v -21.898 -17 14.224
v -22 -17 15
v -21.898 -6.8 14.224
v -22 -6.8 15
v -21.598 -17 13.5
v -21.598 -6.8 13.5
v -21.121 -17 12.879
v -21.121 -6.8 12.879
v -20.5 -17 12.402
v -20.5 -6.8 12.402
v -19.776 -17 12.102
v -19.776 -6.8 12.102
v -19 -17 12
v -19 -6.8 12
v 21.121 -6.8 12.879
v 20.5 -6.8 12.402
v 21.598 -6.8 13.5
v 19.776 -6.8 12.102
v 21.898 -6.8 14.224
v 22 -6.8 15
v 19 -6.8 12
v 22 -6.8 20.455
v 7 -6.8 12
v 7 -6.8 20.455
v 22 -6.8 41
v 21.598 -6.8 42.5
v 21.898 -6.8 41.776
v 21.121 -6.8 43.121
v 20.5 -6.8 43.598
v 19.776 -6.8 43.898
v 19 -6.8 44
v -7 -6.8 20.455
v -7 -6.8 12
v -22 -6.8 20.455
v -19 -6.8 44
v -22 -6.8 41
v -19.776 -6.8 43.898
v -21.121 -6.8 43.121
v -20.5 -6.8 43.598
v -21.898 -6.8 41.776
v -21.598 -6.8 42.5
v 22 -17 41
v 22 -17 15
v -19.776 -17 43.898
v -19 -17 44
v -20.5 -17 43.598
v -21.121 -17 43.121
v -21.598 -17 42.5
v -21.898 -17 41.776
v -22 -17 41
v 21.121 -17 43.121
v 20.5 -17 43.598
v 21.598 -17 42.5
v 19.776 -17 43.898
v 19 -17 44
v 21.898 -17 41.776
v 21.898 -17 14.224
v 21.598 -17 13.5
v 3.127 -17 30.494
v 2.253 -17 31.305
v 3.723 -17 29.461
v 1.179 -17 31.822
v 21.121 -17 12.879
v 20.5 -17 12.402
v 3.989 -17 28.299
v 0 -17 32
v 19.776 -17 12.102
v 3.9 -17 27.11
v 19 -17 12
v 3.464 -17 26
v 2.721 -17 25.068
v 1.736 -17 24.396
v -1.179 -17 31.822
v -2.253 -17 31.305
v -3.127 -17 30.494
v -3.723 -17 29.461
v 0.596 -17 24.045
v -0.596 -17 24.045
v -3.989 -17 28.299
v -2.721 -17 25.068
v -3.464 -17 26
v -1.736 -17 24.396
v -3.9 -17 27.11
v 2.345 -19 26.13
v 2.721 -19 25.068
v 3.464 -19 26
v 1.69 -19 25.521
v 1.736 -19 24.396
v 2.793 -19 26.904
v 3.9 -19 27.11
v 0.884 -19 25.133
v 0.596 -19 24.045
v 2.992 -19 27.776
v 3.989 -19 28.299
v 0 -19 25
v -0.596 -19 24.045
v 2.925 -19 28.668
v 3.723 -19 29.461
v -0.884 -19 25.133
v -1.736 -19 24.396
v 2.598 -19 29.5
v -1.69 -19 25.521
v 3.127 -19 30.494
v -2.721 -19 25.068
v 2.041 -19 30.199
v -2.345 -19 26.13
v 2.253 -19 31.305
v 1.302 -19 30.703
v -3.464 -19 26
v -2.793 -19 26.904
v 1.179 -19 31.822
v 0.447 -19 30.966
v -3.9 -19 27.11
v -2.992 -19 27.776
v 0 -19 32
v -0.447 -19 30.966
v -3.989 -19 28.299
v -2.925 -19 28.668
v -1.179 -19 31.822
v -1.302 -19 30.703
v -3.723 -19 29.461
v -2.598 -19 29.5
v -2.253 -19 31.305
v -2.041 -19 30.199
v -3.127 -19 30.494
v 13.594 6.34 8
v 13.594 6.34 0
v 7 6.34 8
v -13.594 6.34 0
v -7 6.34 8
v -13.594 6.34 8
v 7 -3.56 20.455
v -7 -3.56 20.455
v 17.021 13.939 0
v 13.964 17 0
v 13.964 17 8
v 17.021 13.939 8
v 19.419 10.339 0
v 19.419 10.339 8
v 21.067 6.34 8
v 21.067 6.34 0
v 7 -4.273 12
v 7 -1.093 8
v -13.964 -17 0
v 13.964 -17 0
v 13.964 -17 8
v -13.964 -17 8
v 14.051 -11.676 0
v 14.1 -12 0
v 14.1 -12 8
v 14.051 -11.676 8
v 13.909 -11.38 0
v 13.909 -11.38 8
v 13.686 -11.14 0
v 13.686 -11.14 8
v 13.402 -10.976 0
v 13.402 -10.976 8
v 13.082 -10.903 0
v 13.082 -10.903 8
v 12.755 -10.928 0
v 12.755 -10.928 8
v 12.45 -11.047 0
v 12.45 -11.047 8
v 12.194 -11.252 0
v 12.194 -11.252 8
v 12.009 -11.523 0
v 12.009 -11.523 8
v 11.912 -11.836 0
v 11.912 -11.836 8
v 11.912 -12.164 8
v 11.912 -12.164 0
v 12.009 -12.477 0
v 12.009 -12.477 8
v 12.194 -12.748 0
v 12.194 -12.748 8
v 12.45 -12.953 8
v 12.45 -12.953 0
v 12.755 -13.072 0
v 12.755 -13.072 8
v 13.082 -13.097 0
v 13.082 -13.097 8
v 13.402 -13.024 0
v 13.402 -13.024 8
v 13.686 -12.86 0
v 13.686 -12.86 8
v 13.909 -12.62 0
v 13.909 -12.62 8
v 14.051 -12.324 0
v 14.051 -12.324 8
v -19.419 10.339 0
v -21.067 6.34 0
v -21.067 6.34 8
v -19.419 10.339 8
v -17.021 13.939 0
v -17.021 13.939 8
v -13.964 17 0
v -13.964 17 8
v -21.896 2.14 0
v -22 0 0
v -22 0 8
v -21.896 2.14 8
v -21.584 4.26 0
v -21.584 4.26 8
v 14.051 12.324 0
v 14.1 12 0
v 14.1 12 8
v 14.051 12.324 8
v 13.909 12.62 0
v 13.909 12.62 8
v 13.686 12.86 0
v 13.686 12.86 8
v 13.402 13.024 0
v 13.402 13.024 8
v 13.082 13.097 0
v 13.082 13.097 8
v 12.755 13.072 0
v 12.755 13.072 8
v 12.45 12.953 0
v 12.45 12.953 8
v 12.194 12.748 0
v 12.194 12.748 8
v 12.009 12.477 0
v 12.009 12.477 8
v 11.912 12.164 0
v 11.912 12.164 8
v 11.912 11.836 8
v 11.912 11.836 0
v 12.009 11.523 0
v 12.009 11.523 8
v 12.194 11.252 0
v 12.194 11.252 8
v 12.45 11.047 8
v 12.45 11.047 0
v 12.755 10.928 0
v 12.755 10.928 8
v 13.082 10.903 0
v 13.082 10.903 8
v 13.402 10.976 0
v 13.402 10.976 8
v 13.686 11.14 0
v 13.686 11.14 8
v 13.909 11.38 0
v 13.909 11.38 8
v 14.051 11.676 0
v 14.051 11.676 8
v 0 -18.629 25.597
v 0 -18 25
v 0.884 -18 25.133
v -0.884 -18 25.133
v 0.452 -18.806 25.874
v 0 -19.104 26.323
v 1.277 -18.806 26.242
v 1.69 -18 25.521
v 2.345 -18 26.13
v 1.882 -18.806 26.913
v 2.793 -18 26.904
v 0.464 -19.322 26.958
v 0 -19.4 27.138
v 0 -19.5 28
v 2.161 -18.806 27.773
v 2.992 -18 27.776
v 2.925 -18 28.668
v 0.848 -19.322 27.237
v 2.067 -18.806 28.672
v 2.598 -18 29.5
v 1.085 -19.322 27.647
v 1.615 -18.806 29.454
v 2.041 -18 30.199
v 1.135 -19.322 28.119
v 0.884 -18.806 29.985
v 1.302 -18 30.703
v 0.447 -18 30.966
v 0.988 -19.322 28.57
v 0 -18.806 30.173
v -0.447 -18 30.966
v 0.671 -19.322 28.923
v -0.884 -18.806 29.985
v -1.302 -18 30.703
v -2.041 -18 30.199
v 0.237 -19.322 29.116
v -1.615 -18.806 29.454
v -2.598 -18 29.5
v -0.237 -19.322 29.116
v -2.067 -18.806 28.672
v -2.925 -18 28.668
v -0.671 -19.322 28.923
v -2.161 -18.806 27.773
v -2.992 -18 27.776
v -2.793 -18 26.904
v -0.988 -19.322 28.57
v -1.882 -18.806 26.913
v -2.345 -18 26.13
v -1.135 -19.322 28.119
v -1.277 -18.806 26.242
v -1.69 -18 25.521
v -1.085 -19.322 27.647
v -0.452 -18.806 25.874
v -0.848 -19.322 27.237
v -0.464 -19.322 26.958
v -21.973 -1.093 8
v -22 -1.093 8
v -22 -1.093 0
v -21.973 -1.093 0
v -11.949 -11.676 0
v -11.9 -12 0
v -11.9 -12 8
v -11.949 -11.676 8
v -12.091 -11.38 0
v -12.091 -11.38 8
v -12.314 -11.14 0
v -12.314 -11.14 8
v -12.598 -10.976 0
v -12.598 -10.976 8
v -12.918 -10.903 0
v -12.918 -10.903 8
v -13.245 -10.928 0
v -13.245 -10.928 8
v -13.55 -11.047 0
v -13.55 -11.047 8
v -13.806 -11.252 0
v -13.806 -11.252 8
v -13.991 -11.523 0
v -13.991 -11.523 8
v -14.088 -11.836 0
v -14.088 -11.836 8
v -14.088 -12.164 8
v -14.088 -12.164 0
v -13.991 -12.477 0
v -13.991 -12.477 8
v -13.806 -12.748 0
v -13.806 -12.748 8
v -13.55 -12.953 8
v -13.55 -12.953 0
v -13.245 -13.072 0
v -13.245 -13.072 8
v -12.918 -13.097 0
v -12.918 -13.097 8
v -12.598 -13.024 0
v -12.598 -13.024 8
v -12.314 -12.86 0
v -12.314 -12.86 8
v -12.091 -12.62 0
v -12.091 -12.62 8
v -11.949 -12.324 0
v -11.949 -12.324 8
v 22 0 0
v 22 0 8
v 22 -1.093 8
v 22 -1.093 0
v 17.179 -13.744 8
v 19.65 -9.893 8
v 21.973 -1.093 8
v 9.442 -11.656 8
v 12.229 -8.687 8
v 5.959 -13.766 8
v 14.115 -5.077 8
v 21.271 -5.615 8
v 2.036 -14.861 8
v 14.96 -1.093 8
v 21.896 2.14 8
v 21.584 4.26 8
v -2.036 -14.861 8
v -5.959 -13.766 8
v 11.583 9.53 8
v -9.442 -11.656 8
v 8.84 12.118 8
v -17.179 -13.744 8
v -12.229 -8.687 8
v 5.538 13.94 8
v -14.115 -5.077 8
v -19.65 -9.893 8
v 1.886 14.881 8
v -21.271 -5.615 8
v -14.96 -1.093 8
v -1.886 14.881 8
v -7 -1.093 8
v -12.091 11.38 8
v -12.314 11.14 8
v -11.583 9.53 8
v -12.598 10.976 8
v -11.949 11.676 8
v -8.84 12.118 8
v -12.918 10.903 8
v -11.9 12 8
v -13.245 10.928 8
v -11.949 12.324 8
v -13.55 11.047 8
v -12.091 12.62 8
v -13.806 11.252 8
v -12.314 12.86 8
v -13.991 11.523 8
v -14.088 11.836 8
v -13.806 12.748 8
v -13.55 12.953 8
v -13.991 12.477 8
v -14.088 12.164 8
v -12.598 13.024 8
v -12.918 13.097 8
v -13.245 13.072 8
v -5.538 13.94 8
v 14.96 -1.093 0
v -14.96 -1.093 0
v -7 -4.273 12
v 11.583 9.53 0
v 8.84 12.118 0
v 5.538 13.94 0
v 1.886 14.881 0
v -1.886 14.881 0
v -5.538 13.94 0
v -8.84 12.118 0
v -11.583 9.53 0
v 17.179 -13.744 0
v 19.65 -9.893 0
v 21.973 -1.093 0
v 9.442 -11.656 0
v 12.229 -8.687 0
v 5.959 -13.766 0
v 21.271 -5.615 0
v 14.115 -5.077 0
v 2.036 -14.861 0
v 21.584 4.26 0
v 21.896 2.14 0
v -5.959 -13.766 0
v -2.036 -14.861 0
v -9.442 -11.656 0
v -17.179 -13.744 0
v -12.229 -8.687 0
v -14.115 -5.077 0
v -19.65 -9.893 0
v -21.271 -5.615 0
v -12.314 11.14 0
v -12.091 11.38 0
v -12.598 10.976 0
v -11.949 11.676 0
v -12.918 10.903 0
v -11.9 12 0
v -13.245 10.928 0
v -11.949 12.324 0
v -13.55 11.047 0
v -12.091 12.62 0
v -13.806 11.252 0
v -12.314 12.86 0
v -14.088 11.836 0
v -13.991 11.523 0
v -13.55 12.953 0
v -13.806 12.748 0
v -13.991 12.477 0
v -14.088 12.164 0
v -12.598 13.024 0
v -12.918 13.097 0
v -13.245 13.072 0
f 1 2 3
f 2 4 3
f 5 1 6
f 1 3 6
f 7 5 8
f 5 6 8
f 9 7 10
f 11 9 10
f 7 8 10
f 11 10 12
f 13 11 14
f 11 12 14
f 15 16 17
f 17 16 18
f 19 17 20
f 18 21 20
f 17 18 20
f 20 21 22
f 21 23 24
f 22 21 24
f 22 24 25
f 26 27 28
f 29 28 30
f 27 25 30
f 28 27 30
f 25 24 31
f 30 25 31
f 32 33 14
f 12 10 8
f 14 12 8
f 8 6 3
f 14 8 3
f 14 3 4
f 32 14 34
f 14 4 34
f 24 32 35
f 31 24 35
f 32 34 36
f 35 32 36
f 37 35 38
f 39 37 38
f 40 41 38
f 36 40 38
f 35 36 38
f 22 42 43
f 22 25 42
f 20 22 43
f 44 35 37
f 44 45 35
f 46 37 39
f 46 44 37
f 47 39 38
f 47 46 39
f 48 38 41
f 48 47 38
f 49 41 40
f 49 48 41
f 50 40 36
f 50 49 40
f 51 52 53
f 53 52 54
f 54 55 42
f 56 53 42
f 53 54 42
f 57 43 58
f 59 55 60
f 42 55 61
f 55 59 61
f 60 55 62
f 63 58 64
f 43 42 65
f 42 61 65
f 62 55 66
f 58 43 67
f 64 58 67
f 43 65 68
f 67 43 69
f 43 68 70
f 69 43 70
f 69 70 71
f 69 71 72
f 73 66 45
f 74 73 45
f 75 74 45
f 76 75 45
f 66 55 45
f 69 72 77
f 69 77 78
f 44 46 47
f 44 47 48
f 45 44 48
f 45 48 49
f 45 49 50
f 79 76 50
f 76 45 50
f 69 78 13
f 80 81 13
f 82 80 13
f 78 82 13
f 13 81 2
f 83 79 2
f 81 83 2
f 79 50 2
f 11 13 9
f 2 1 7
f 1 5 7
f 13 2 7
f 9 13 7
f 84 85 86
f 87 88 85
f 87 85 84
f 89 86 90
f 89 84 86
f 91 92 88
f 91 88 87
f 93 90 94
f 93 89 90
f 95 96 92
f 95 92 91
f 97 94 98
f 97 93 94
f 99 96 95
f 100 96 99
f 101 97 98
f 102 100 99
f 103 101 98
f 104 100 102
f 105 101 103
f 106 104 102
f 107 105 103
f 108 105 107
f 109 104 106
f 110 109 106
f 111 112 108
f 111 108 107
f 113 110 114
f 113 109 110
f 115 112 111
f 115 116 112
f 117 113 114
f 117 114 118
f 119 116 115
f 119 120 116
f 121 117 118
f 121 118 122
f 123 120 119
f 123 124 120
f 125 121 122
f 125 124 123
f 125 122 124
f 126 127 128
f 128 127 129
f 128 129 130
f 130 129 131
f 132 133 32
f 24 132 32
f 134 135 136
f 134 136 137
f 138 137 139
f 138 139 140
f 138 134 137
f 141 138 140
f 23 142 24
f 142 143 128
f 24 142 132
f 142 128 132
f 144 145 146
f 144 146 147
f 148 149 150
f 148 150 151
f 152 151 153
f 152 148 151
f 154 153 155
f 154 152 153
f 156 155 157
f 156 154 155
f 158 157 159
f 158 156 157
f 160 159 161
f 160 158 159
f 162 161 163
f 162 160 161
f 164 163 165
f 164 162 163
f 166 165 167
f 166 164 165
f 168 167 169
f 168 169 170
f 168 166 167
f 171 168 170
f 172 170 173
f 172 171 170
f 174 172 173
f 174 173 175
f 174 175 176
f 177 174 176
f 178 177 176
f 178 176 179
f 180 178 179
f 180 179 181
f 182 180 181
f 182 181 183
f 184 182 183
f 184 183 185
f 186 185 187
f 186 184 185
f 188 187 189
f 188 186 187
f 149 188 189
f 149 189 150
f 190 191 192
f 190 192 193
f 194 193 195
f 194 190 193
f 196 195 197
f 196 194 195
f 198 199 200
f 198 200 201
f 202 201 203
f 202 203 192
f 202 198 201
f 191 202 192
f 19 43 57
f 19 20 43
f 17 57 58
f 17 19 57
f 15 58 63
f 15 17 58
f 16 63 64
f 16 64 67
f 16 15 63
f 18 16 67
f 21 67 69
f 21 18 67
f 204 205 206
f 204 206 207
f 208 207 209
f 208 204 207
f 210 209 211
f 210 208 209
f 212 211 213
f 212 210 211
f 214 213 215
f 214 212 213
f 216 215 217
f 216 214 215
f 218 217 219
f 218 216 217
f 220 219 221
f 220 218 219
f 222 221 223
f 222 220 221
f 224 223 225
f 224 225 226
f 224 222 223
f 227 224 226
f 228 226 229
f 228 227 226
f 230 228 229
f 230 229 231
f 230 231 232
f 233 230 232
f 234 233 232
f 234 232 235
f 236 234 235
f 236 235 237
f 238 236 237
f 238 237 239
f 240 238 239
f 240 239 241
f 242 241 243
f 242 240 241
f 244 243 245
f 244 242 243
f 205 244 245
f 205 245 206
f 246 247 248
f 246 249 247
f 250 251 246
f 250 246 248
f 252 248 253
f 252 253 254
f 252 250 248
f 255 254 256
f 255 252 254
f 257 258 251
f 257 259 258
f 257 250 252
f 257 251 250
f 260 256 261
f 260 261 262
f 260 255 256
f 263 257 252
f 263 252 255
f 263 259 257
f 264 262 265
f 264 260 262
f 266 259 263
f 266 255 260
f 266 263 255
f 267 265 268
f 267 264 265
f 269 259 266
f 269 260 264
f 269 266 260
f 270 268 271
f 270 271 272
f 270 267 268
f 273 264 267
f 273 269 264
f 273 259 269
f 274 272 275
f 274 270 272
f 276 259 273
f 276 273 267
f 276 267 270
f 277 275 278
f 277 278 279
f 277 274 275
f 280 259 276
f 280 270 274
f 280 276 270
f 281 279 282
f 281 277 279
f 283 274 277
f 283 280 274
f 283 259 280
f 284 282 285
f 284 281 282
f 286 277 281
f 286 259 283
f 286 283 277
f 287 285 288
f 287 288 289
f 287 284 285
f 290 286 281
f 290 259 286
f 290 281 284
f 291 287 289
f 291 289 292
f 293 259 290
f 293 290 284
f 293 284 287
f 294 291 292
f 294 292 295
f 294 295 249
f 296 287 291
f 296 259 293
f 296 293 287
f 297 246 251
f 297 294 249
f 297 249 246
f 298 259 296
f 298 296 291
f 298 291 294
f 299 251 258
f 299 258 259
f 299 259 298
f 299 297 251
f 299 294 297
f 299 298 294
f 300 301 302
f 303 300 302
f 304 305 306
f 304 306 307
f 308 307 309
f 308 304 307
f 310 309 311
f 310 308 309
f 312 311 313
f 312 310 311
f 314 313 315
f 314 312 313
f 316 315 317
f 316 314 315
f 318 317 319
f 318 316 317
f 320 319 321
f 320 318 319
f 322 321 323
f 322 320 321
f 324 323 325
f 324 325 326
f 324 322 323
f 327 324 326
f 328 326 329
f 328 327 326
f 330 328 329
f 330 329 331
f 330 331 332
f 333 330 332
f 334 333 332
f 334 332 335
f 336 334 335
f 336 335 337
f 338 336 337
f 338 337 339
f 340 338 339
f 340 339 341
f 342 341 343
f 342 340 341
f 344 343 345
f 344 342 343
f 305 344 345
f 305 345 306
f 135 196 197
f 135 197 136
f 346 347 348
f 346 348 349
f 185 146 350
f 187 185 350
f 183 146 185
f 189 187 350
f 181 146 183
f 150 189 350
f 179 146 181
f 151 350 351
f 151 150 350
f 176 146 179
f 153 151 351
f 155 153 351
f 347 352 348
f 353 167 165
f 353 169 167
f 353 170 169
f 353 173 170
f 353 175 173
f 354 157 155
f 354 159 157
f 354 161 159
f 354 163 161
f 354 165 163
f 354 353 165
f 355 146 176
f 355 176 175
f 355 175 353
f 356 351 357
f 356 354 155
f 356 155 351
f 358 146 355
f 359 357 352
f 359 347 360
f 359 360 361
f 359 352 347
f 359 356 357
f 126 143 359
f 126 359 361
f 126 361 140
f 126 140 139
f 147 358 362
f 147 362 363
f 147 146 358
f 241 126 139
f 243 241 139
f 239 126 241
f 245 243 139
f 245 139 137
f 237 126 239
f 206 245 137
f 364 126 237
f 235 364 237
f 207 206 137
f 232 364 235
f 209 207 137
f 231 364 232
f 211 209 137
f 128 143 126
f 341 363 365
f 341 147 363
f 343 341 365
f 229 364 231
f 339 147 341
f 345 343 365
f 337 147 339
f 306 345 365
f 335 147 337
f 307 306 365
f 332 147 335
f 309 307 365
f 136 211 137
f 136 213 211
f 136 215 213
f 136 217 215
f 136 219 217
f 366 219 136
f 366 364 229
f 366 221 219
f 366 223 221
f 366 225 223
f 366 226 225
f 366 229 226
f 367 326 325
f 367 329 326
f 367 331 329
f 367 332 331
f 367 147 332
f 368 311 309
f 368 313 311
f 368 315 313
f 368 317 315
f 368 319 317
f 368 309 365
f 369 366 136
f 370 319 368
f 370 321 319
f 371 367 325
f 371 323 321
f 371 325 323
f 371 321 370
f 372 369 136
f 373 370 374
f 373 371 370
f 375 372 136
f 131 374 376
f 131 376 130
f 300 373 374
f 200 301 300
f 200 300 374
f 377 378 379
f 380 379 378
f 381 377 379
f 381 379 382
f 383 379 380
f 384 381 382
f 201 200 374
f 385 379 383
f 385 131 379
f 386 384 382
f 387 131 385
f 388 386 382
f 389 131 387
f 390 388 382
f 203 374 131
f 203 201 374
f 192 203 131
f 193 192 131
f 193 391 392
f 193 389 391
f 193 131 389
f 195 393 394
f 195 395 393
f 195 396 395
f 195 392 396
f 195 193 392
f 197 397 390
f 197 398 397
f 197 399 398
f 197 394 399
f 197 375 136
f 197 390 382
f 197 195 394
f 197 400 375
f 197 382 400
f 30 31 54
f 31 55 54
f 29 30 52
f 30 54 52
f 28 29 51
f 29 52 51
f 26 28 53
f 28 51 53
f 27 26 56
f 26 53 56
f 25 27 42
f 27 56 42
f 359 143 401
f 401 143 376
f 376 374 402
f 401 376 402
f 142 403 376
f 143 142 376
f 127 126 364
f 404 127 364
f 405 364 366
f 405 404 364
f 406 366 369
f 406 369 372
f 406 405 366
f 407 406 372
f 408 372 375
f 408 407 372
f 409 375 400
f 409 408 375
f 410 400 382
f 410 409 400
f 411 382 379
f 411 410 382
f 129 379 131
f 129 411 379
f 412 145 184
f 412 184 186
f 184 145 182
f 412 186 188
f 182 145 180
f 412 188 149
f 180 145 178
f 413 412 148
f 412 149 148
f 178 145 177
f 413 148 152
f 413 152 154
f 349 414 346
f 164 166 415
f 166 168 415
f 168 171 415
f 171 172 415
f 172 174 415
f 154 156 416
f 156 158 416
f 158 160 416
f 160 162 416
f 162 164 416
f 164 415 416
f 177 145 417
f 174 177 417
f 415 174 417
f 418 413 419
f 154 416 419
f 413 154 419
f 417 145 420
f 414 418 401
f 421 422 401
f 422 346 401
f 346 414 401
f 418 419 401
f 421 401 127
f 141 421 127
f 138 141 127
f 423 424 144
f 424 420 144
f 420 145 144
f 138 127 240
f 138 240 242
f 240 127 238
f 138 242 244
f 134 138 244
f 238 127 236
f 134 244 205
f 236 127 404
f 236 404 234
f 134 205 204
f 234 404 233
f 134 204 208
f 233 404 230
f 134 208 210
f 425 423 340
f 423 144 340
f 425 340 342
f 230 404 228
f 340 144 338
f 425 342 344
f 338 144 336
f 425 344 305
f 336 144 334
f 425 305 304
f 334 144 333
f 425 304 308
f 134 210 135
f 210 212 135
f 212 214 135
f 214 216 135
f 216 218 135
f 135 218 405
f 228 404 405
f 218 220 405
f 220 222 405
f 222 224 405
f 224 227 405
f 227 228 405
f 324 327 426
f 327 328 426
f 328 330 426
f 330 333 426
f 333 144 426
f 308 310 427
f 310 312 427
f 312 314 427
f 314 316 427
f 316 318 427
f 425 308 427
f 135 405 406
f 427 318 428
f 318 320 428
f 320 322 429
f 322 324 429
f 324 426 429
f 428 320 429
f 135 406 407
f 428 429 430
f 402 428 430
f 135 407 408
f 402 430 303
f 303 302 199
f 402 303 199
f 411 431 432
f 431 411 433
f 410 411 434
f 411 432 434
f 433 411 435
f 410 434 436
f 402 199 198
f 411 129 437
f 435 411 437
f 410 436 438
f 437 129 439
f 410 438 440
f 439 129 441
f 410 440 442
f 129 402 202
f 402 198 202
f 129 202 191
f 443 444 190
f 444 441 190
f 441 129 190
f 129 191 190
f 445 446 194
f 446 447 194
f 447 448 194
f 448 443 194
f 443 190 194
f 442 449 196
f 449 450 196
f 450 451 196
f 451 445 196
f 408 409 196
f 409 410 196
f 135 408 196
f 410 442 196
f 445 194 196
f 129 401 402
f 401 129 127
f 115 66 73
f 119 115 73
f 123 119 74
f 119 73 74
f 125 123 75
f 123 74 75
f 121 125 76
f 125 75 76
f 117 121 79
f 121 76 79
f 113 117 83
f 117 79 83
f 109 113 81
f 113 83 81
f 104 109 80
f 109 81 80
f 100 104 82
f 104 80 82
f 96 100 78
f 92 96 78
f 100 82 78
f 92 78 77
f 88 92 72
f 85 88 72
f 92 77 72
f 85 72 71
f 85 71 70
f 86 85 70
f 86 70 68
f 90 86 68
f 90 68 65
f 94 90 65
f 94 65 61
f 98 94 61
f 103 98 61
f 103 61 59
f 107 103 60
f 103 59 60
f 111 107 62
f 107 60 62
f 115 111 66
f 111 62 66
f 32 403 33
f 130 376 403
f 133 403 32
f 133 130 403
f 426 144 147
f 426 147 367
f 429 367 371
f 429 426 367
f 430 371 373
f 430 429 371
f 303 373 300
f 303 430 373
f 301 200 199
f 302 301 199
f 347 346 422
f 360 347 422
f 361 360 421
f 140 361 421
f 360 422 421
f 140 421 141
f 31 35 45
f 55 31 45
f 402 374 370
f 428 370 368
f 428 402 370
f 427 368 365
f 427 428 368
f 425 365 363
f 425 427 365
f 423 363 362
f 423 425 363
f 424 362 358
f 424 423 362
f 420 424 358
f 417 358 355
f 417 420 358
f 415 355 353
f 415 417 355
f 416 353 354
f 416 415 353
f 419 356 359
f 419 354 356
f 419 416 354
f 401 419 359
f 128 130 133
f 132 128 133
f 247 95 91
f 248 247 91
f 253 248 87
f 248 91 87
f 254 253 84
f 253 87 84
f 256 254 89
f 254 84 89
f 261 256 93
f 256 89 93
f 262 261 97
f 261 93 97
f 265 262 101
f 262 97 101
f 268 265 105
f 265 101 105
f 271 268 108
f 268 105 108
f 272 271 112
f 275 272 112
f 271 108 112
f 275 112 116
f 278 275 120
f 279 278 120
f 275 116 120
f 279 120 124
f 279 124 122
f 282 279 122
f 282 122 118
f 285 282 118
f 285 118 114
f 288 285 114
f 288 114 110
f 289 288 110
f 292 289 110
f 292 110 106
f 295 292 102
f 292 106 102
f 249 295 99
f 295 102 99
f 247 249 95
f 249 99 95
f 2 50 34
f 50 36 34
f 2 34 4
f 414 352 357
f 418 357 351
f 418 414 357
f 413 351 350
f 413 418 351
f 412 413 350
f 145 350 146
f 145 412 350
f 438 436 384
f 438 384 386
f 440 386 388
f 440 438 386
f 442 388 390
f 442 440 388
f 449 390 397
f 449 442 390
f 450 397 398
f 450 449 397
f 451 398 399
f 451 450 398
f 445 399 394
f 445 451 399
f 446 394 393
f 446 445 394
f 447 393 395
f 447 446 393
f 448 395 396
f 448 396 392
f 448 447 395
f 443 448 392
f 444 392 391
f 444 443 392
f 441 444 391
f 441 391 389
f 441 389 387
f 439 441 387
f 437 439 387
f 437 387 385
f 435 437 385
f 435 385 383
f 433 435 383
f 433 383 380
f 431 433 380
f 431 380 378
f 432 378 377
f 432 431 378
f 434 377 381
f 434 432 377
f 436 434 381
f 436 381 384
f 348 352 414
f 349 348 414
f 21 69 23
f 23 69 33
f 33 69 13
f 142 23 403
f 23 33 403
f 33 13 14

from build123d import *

# Parameters (mm, degrees)
SKETCH_1_R           = 15
SKETCH_1_R_2         = 1.1
EXTRUDE_1_DEPTH      = 8
EXTRUDE_2_DEPTH      = 22
EXTRUDE_2_DEPTH_BACK = 22
SKETCH_5_W           = 12.455474759
SKETCH_5_H           = 13.140065833
CUT_EXTRUDE_1_DEPTH  = 15
CUT_EXTRUDE_START    = -15
CUT_EXTRUDE_2_DEPTH  = 15
SKETCH_7_R           = 4
EXTRUDE_3_DEPTH      = 2
SKETCH_8_R           = 3
CUT_EXTRUDE_3_DEPTH  = 1
DOME_1_FACE_RADIUS   = 3
DOME_1_HEIGHT        = 1.5
FILLET_1_R           = 3


with BuildPart() as part:
    # 草图1 → 凸台-拉伸1 (new body)
    with BuildSketch(Plane.XY):
        with BuildLine():
            Line((13.964240044, -17), (-13.964240044, -17))
            ThreePointArc((-13.964240044, -17), (-22, 0), (-13.964240044, 17))
            Line((-13.964240044, 17), (13.964240044, 17))
            ThreePointArc((13.964240044, 17), (22, 0), (13.964240044, -17))
        make_face()
        Circle(SKETCH_1_R, mode=Mode.SUBTRACT)
        with Locations((-13, 12)):
            Circle(SKETCH_1_R_2, mode=Mode.SUBTRACT)
        with Locations((13, 12)):
            Circle(SKETCH_1_R_2, mode=Mode.SUBTRACT)
        with Locations((13, -12)):
            Circle(SKETCH_1_R_2, mode=Mode.SUBTRACT)
        with Locations((-13, -12)):
            Circle(SKETCH_1_R_2, mode=Mode.SUBTRACT)
    extrude(amount=EXTRUDE_1_DEPTH)

    # 草图3 → 凸台-拉伸2 (add, two sides: drawn at the far end of the back side and taken through both)
    with BuildSketch(Plane(origin=(0, 0, 0), x_dir=(0, 0, -1), z_dir=(1, 0, 0)).offset(-EXTRUDE_2_DEPTH_BACK)):
        Polygon((-12, -6.8), (-12, -4.272567443), (-8, -1.093373368), (0, -1.093373368), (0, 6.340065833), (-8, 6.340065833), (-20.455474759, -3.559527056), (-20.455474759, -6.8), (-44, -6.8), (-44, -17), (-12, -17), align=None)
    extrude(amount=EXTRUDE_2_DEPTH + EXTRUDE_2_DEPTH_BACK)

    # 草图5 → 切除-拉伸1 (cut)
    with BuildSketch(Plane.ZY.offset(22)):
        with Locations((14.22773738, -0.229967084)):
            Rectangle(SKETCH_5_W, SKETCH_5_H)
    cut_extrude_1 = extrude(amount=-CUT_EXTRUDE_1_DEPTH, mode=Mode.SUBTRACT)

    # 镜向1: 切除-拉伸1 across plane
    add(cut_extrude_1.mirror(Plane(origin=(0, 0, 0), x_dir=(0, 0, 1), z_dir=(1, 0, 0))), mode=Mode.SUBTRACT)

    # 草图6 → 切除-拉伸2 (cut)
    with BuildSketch(Plane.XY.offset(8).offset(CUT_EXTRUDE_START)):
        with BuildLine():
            Line((21.066645799, 6.340065833), (22, 6.340065833))
            Line((22, 6.340065833), (22, 0))
            ThreePointArc((22, 0), (21.76541072, 3.204199776), (21.066645799, 6.340065833))
        make_face()
        with BuildLine():
            Line((-21.066645799, 6.340065833), (-22, 6.340065833))
            Line((-22, 6.340065833), (-22, 0))
            ThreePointArc((-22, 0), (-21.76541072, 3.204199776), (-21.066645799, 6.340065833))
        make_face()
    extrude(amount=CUT_EXTRUDE_2_DEPTH, mode=Mode.SUBTRACT)

    # 草图7 → 凸台-拉伸3 (add)
    with BuildSketch(Plane.XZ.offset(17)):
        with Locations(Location((0, 28, 0), (0, 0, 90))):
            Circle(SKETCH_7_R)
    extrude(amount=EXTRUDE_3_DEPTH)

    # 草图8 → 切除-拉伸3 (cut)
    with BuildSketch(Plane.XZ.offset(19)):
        with Locations(Location((0, 28, 0), (0, 0, 270))):
            Circle(SKETCH_8_R)
    extrude(amount=-CUT_EXTRUDE_3_DEPTH, mode=Mode.SUBTRACT)

    # 圆顶1: a dome of height H over a round flat face of radius A is a cap of a sphere of radius (A * A + H * H) / (2 * H)
    dome_1_r = (DOME_1_FACE_RADIUS * DOME_1_FACE_RADIUS + DOME_1_HEIGHT * DOME_1_HEIGHT) / (2 * DOME_1_HEIGHT)
    dome_1_base = Plane((0, -18, 28), z_dir=(0, -1, 0))
    with Locations(dome_1_base.offset(DOME_1_HEIGHT - dome_1_r)):
        dome_1_ball = Sphere(dome_1_r, mode=Mode.PRIVATE)
    add(split(dome_1_ball, bisect_by=dome_1_base, keep=Keep.TOP, mode=Mode.PRIVATE))

    # 圆角1
    fillet_1_edges = [part.edges().sort_by_distance(p)[0] for p in [
        (-22, -11.9, 12),
        (-22, -11.9, 44),
        (22, -11.9, 12),
        (22, -11.9, 44),
    ]]
    fillet(fillet_1_edges, radius=FILLET_1_R)


solid = part.part
